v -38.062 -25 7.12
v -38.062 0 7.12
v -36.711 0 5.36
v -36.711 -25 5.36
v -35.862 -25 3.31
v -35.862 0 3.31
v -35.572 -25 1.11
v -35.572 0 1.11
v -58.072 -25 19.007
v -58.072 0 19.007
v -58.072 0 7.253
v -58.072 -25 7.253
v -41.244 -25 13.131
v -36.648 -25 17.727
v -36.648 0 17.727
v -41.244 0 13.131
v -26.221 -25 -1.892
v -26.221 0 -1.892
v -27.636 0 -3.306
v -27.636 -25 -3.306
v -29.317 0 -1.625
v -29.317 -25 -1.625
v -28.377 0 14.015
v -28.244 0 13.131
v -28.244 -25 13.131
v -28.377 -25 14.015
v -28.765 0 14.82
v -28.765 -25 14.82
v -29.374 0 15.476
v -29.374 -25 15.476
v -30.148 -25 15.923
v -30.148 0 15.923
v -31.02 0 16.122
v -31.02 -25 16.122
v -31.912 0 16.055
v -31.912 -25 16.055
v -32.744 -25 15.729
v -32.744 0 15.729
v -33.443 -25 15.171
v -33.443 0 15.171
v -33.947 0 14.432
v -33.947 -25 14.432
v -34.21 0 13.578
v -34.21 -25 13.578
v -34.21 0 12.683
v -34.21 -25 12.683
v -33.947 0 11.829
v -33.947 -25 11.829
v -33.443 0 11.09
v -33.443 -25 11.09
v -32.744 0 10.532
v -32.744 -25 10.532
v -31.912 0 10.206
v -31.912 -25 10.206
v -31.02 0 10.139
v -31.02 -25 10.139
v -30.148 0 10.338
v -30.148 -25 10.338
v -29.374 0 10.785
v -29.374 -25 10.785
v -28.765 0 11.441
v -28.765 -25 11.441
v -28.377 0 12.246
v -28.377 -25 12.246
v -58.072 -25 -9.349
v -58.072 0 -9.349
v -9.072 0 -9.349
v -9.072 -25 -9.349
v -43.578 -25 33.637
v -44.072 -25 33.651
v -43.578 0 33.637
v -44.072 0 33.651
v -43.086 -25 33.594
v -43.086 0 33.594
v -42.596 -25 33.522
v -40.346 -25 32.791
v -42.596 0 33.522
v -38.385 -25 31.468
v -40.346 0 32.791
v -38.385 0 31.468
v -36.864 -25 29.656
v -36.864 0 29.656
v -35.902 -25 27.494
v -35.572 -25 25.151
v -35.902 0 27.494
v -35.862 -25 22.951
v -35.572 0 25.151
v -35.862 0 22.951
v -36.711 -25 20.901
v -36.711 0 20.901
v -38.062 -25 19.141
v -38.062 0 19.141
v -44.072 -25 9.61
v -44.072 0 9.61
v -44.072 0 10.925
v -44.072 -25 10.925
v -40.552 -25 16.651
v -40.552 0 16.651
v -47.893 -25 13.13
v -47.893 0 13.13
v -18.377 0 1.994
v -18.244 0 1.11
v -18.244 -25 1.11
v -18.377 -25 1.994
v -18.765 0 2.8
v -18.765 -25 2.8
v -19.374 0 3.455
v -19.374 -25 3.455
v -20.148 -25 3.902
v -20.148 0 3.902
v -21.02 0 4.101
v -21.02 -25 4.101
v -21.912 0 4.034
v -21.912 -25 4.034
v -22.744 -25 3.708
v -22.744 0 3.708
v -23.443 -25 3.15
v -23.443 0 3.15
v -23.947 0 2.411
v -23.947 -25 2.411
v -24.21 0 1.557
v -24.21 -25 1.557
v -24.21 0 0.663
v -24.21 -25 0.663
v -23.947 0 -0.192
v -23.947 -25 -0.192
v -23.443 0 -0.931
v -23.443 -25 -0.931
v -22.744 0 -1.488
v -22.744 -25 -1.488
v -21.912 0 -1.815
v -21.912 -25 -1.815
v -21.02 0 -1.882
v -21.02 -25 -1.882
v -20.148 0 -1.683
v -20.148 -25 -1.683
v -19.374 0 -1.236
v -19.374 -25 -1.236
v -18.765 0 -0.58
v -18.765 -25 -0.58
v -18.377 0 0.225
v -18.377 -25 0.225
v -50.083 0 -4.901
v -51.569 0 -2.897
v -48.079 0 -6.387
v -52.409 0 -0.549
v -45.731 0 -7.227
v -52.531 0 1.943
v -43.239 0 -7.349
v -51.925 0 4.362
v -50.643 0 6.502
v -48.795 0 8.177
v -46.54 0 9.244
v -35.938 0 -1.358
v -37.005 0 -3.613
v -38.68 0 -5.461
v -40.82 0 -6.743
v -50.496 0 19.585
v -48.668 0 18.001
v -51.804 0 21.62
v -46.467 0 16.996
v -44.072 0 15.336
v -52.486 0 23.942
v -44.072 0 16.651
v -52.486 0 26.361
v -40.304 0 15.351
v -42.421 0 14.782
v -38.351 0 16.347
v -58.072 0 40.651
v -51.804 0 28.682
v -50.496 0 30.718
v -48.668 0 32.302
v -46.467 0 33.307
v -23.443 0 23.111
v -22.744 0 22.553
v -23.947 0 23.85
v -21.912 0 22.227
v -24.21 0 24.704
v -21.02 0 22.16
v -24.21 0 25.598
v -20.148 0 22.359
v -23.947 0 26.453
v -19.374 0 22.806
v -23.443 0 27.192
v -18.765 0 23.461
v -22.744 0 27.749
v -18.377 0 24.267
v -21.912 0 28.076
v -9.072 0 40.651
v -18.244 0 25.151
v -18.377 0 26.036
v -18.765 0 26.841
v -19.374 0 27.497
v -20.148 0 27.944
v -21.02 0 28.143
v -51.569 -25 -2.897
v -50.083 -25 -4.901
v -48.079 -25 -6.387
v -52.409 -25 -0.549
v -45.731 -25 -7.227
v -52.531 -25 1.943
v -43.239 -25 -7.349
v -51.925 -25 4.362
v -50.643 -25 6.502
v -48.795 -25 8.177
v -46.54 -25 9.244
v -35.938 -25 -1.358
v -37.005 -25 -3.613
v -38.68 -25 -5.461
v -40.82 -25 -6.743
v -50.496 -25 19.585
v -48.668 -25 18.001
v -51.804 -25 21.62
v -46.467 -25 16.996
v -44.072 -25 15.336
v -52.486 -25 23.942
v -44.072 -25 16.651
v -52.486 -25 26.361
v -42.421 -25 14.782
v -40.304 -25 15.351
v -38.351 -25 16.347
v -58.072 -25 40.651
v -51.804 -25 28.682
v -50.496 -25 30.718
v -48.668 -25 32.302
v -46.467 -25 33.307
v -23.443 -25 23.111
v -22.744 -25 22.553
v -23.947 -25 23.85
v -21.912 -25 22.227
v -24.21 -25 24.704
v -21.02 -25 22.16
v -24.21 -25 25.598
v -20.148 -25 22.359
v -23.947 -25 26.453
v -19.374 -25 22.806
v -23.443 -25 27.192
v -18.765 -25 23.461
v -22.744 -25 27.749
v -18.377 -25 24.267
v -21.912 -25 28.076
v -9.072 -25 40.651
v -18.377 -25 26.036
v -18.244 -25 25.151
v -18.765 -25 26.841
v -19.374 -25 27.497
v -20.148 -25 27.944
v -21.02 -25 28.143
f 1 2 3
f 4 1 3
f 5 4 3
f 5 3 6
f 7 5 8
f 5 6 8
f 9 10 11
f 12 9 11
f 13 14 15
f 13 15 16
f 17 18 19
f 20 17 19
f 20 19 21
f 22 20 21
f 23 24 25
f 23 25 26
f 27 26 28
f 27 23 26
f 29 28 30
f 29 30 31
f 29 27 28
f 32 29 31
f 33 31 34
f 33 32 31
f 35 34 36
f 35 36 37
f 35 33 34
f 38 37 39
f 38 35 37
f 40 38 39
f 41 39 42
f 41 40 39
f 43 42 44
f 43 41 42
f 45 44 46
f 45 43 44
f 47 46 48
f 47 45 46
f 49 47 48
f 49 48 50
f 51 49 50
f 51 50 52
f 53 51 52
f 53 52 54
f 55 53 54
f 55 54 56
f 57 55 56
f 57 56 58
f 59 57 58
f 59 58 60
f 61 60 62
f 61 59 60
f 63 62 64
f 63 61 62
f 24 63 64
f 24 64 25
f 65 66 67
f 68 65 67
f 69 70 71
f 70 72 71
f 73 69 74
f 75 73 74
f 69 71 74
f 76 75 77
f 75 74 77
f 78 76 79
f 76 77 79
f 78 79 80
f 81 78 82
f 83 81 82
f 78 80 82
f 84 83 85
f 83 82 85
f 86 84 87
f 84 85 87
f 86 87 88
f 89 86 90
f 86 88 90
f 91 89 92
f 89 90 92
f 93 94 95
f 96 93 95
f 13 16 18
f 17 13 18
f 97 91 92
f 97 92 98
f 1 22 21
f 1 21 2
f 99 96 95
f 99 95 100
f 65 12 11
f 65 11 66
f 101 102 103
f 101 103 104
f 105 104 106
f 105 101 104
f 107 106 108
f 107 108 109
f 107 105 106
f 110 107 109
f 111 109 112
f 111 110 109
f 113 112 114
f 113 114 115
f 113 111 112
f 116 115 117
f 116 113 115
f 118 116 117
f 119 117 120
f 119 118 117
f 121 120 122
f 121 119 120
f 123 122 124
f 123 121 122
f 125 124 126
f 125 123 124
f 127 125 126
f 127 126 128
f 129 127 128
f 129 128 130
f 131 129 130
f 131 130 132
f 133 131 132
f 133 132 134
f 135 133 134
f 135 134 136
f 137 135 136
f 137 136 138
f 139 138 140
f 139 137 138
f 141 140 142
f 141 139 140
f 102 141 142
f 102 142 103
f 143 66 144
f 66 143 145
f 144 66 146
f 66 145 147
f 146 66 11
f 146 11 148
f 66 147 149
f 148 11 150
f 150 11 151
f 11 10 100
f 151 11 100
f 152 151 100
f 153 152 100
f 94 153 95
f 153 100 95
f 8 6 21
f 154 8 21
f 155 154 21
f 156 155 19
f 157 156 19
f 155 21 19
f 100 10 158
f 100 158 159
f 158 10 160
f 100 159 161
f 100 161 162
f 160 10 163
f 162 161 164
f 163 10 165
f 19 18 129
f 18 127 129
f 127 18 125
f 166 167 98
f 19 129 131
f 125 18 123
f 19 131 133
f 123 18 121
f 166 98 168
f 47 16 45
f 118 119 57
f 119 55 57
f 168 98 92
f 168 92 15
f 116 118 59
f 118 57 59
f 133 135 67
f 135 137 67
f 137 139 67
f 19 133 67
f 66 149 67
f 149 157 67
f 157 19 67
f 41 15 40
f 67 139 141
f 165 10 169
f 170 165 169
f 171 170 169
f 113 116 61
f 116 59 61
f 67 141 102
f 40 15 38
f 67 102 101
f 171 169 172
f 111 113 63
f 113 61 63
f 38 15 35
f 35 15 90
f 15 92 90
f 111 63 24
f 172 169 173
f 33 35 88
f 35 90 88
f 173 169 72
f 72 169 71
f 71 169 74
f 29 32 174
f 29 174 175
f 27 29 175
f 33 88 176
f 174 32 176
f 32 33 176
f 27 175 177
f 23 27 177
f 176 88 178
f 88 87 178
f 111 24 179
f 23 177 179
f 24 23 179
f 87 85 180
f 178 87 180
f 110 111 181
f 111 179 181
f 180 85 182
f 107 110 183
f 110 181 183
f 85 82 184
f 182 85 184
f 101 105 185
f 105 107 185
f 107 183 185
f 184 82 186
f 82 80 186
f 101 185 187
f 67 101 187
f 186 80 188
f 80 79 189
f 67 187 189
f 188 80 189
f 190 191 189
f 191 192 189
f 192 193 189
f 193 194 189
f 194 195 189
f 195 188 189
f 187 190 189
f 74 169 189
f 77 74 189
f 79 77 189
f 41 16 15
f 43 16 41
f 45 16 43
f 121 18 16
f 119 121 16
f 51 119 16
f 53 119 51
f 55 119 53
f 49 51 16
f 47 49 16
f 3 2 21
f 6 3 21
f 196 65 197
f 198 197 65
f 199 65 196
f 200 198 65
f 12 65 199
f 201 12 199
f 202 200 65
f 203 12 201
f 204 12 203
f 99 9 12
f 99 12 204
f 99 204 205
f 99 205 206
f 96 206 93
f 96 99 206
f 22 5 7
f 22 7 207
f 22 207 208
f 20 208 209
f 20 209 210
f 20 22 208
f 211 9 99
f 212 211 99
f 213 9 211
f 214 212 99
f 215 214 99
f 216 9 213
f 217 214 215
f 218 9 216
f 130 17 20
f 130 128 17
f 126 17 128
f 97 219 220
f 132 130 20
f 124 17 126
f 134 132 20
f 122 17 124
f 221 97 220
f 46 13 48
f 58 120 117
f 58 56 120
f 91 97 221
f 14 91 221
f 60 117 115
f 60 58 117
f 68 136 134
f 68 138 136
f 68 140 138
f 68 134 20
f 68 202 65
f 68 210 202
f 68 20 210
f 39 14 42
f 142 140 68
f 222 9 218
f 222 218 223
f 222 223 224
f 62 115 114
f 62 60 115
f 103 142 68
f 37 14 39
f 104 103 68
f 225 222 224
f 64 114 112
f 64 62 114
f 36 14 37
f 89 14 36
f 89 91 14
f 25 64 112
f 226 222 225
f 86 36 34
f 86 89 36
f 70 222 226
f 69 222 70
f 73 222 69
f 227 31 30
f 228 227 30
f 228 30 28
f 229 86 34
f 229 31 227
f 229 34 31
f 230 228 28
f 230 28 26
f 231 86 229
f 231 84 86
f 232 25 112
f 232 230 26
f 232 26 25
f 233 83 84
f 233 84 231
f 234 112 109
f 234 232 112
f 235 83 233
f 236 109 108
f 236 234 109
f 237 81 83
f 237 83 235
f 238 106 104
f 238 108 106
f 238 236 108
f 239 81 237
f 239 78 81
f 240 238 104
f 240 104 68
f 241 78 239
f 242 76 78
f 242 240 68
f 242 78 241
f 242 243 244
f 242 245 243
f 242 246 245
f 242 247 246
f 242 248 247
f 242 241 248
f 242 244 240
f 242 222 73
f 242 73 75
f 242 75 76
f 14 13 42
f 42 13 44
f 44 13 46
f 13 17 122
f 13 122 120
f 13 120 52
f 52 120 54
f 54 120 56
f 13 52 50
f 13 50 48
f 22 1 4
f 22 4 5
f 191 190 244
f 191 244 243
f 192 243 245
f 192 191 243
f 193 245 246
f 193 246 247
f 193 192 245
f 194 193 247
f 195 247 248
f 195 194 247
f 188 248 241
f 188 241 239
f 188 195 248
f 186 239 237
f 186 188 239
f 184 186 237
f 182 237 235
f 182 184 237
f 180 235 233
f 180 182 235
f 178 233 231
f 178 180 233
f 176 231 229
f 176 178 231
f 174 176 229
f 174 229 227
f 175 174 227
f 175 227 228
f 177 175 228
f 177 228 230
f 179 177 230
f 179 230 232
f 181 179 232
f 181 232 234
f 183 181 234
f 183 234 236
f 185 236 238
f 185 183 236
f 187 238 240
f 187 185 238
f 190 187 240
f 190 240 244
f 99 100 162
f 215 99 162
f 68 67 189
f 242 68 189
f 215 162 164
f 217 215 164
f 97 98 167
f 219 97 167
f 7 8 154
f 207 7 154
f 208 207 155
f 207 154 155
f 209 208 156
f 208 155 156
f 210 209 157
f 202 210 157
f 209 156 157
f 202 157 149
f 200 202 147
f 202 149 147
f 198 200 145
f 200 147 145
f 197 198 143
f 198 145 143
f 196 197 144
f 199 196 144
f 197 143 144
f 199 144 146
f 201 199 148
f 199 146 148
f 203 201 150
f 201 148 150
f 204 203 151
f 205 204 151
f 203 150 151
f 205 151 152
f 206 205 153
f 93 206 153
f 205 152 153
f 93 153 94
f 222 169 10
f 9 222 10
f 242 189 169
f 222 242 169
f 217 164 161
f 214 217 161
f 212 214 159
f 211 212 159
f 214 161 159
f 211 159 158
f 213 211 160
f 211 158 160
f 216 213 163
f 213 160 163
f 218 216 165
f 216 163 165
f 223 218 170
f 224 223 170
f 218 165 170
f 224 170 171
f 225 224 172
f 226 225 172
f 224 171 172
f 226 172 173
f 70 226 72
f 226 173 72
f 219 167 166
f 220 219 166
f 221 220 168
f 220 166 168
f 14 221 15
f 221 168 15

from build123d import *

# Parameters (mm, degrees)
F1_DEPTH = 25
F0_R     = 3
F2_DEPTH = 25


# Not quite as in the source:
# - ends of sketch curves that miss each other by under 0.0002 mm in the source are joined


with BuildPart() as f1:
    # F0 (on Front) → F1 (new body)
    with BuildSketch(Plane.XZ):
        with BuildLine():
            ThreePointArc((-35.5724336391, 25.151316084), (-36.2194536929, 21.8985163721), (-38.0620115133, 19.1409229296))
            Line((-38.0620115133, 19.1409229296), (-40.551597873, 16.6513245695))
            Line((-40.551597873, 16.6513245695), (-42.4208999514, 14.7820134806))
            ThreePointArc((-42.4208999514, 14.7820134806), (-39.3014754977, 15.797816289), (-36.6477945425, 17.7267127756))
            ThreePointArc((-36.6477945425, 17.7267127756), (-34.0584132659, 28.3087511137), (-42.2491526952, 35.491801885))
            ThreePointArc((-42.2491526952, 35.491801885), (-43.1573109451, 35.6113615168), (-44.0724336391, 35.651316084))
            Line((-44.0724336391, 35.651316084), (-44.0724336391, 33.651316084))
            ThreePointArc((-44.0724336391, 33.651316084), (-43.3316200297, 33.6189719105), (-42.5964443036, 33.5221855419))
            ThreePointArc((-42.5964443036, 33.5221855419), (-37.5610624566, 30.6150186129), (-35.5724336391, 25.151316084))
        make_face()
    extrude(amount=F1_DEPTH)

    # F0 (on Front) → F2 (join)
    with BuildSketch(Plane.XZ):
        with BuildLine():
            Line((-44.0724072079, 15.3363250258), (-44.0724107491, 16.651316084))
            ThreePointArc((-44.0724107491, 16.651316084), (-52.5724336391, 25.151304639), (-44.0724336391, 33.651316084))
            Line((-44.0724336391, 33.651316084), (-44.0724336391, 35.651316084))
            Line((-44.0724336391, 35.651316084), (-44.0724336391, 40.651316084))
            Line((-44.0724336391, 40.651316084), (-58.0724336391, 40.651316084))
            Line((-58.0724336391, 40.651316084), (-58.0722360097, 19.007240245))
            Line((-58.0722360097, 19.007240245), (-47.893068168, 13.1304188771))
            Line((-47.893068168, 13.1304188771), (-44.0724072079, 15.3363250258))
        make_face()
        Polygon((-18.7646776515, 35.6099158673), (-36.6477945425, 17.7267127756), (-41.2439775428, 13.1305076206), (-26.2214527658, -1.8919447448), (-18.7646776515, -9.348683916), (-9.0724336391, -9.348683916), (-9.0724336391, 35.6099158673), align=None)
        with Locations((-21.2439775428, 1.1096808038)):
            Circle(F0_R, mode=Mode.SUBTRACT)
        with Locations((-31.2439775428, 13.1305076206)):
            Circle(F0_R, mode=Mode.SUBTRACT)
        with Locations((-21.2439775428, 25.1513302219)):
            Circle(F0_R, mode=Mode.SUBTRACT)
        with BuildLine():
            ThreePointArc((-42.2491526952, 35.491801885), (-34.0584132659, 28.3087511137), (-36.6477945425, 17.7267127756))
            Line((-36.6477945425, 17.7267127756), (-18.7646776515, 35.6099158673))
            Line((-18.7646776515, 35.6099158673), (-9.0724336391, 35.6099158673))
            Line((-9.0724336391, 35.6099158673), (-9.0724336391, 40.651316084))
            Line((-9.0724336391, 40.651316084), (-18.7646776515, 40.651316084))
            Line((-18.7646776515, 40.651316084), (-44.0724336391, 40.651316084))
            Line((-44.0724336391, 40.651316084), (-44.0724336391, 35.651316084))
            ThreePointArc((-44.0724336391, 35.651316084), (-43.1573109451, 35.6113615168), (-42.2491526952, 35.491801885))
        make_face()
        with BuildLine():
            Line((-44.0723953274, 10.9245988987), (-47.893068168, 13.1304188771))
            Line((-47.893068168, 13.1304188771), (-58.0721286869, 7.2534116208))
            Line((-58.0721286869, 7.2534116208), (-58.0719770953, -9.348683916))
            Line((-58.0719770953, -9.348683916), (-21.593111593, -9.348683916))
            Line((-21.593111593, -9.348683916), (-27.6356629198, -3.3061617156))
            Line((-27.6356629198, -3.3061617156), (-29.3171299504, -1.62470279))
            Line((-29.3171299504, -1.62470279), (-38.061976782, 7.1201018897))
            ThreePointArc((-38.061976782, 7.1201018897), (-36.2193967899, 4.3624994422), (-35.5723688964, 1.1096808038))
            ThreePointArc((-35.5723688964, 1.1096808038), (-50.0827684437, -4.9007349291), (-44.0723917864, 9.6096808038))
            Line((-44.0723917864, 9.6096808038), (-44.0723953274, 10.9245988987))
        make_face()
        Polygon((-58.0721286869, 7.2534116208), (-47.893068168, 13.1304188771), (-58.0722360097, 19.007240245), align=None)
        Polygon((-18.7646776515, -9.348683916), (-26.2214527658, -1.8919447448), (-27.6356629198, -3.3061617156), (-21.593111593, -9.348683916), align=None)
    extrude(amount=F2_DEPTH)


solid = f1.part
